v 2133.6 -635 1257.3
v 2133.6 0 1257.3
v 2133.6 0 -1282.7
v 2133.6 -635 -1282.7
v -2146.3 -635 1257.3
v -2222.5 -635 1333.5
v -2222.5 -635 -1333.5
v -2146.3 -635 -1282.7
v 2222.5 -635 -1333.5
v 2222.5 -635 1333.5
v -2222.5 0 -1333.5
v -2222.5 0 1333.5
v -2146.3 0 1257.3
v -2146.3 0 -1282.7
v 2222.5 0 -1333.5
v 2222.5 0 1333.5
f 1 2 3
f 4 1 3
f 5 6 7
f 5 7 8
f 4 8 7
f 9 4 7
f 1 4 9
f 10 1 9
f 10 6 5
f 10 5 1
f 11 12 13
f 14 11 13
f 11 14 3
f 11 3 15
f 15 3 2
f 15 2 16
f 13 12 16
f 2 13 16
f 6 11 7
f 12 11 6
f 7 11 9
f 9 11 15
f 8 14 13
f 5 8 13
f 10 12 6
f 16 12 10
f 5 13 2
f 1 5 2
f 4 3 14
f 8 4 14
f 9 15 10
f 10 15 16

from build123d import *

# Parameters (mm, degrees)
F0_W     = 4445
F0_H     = 2667
F1_DEPTH = 635


with BuildPart() as f1:
    # F0 (on Front) → F1 (new body)
    with BuildSketch(Plane.XZ):
        Rectangle(F0_W, F0_H)
        Polygon((-1892.3, 1257.3), (596.9, 1257.3), (2006.6, 1257.3), (2133.6, 1257.3), (2133.6, -1282.7), (-2146.3, -1282.7), (-2146.3, 1257.3), align=None, mode=Mode.SUBTRACT)
    extrude(amount=F1_DEPTH)


solid = f1.part
